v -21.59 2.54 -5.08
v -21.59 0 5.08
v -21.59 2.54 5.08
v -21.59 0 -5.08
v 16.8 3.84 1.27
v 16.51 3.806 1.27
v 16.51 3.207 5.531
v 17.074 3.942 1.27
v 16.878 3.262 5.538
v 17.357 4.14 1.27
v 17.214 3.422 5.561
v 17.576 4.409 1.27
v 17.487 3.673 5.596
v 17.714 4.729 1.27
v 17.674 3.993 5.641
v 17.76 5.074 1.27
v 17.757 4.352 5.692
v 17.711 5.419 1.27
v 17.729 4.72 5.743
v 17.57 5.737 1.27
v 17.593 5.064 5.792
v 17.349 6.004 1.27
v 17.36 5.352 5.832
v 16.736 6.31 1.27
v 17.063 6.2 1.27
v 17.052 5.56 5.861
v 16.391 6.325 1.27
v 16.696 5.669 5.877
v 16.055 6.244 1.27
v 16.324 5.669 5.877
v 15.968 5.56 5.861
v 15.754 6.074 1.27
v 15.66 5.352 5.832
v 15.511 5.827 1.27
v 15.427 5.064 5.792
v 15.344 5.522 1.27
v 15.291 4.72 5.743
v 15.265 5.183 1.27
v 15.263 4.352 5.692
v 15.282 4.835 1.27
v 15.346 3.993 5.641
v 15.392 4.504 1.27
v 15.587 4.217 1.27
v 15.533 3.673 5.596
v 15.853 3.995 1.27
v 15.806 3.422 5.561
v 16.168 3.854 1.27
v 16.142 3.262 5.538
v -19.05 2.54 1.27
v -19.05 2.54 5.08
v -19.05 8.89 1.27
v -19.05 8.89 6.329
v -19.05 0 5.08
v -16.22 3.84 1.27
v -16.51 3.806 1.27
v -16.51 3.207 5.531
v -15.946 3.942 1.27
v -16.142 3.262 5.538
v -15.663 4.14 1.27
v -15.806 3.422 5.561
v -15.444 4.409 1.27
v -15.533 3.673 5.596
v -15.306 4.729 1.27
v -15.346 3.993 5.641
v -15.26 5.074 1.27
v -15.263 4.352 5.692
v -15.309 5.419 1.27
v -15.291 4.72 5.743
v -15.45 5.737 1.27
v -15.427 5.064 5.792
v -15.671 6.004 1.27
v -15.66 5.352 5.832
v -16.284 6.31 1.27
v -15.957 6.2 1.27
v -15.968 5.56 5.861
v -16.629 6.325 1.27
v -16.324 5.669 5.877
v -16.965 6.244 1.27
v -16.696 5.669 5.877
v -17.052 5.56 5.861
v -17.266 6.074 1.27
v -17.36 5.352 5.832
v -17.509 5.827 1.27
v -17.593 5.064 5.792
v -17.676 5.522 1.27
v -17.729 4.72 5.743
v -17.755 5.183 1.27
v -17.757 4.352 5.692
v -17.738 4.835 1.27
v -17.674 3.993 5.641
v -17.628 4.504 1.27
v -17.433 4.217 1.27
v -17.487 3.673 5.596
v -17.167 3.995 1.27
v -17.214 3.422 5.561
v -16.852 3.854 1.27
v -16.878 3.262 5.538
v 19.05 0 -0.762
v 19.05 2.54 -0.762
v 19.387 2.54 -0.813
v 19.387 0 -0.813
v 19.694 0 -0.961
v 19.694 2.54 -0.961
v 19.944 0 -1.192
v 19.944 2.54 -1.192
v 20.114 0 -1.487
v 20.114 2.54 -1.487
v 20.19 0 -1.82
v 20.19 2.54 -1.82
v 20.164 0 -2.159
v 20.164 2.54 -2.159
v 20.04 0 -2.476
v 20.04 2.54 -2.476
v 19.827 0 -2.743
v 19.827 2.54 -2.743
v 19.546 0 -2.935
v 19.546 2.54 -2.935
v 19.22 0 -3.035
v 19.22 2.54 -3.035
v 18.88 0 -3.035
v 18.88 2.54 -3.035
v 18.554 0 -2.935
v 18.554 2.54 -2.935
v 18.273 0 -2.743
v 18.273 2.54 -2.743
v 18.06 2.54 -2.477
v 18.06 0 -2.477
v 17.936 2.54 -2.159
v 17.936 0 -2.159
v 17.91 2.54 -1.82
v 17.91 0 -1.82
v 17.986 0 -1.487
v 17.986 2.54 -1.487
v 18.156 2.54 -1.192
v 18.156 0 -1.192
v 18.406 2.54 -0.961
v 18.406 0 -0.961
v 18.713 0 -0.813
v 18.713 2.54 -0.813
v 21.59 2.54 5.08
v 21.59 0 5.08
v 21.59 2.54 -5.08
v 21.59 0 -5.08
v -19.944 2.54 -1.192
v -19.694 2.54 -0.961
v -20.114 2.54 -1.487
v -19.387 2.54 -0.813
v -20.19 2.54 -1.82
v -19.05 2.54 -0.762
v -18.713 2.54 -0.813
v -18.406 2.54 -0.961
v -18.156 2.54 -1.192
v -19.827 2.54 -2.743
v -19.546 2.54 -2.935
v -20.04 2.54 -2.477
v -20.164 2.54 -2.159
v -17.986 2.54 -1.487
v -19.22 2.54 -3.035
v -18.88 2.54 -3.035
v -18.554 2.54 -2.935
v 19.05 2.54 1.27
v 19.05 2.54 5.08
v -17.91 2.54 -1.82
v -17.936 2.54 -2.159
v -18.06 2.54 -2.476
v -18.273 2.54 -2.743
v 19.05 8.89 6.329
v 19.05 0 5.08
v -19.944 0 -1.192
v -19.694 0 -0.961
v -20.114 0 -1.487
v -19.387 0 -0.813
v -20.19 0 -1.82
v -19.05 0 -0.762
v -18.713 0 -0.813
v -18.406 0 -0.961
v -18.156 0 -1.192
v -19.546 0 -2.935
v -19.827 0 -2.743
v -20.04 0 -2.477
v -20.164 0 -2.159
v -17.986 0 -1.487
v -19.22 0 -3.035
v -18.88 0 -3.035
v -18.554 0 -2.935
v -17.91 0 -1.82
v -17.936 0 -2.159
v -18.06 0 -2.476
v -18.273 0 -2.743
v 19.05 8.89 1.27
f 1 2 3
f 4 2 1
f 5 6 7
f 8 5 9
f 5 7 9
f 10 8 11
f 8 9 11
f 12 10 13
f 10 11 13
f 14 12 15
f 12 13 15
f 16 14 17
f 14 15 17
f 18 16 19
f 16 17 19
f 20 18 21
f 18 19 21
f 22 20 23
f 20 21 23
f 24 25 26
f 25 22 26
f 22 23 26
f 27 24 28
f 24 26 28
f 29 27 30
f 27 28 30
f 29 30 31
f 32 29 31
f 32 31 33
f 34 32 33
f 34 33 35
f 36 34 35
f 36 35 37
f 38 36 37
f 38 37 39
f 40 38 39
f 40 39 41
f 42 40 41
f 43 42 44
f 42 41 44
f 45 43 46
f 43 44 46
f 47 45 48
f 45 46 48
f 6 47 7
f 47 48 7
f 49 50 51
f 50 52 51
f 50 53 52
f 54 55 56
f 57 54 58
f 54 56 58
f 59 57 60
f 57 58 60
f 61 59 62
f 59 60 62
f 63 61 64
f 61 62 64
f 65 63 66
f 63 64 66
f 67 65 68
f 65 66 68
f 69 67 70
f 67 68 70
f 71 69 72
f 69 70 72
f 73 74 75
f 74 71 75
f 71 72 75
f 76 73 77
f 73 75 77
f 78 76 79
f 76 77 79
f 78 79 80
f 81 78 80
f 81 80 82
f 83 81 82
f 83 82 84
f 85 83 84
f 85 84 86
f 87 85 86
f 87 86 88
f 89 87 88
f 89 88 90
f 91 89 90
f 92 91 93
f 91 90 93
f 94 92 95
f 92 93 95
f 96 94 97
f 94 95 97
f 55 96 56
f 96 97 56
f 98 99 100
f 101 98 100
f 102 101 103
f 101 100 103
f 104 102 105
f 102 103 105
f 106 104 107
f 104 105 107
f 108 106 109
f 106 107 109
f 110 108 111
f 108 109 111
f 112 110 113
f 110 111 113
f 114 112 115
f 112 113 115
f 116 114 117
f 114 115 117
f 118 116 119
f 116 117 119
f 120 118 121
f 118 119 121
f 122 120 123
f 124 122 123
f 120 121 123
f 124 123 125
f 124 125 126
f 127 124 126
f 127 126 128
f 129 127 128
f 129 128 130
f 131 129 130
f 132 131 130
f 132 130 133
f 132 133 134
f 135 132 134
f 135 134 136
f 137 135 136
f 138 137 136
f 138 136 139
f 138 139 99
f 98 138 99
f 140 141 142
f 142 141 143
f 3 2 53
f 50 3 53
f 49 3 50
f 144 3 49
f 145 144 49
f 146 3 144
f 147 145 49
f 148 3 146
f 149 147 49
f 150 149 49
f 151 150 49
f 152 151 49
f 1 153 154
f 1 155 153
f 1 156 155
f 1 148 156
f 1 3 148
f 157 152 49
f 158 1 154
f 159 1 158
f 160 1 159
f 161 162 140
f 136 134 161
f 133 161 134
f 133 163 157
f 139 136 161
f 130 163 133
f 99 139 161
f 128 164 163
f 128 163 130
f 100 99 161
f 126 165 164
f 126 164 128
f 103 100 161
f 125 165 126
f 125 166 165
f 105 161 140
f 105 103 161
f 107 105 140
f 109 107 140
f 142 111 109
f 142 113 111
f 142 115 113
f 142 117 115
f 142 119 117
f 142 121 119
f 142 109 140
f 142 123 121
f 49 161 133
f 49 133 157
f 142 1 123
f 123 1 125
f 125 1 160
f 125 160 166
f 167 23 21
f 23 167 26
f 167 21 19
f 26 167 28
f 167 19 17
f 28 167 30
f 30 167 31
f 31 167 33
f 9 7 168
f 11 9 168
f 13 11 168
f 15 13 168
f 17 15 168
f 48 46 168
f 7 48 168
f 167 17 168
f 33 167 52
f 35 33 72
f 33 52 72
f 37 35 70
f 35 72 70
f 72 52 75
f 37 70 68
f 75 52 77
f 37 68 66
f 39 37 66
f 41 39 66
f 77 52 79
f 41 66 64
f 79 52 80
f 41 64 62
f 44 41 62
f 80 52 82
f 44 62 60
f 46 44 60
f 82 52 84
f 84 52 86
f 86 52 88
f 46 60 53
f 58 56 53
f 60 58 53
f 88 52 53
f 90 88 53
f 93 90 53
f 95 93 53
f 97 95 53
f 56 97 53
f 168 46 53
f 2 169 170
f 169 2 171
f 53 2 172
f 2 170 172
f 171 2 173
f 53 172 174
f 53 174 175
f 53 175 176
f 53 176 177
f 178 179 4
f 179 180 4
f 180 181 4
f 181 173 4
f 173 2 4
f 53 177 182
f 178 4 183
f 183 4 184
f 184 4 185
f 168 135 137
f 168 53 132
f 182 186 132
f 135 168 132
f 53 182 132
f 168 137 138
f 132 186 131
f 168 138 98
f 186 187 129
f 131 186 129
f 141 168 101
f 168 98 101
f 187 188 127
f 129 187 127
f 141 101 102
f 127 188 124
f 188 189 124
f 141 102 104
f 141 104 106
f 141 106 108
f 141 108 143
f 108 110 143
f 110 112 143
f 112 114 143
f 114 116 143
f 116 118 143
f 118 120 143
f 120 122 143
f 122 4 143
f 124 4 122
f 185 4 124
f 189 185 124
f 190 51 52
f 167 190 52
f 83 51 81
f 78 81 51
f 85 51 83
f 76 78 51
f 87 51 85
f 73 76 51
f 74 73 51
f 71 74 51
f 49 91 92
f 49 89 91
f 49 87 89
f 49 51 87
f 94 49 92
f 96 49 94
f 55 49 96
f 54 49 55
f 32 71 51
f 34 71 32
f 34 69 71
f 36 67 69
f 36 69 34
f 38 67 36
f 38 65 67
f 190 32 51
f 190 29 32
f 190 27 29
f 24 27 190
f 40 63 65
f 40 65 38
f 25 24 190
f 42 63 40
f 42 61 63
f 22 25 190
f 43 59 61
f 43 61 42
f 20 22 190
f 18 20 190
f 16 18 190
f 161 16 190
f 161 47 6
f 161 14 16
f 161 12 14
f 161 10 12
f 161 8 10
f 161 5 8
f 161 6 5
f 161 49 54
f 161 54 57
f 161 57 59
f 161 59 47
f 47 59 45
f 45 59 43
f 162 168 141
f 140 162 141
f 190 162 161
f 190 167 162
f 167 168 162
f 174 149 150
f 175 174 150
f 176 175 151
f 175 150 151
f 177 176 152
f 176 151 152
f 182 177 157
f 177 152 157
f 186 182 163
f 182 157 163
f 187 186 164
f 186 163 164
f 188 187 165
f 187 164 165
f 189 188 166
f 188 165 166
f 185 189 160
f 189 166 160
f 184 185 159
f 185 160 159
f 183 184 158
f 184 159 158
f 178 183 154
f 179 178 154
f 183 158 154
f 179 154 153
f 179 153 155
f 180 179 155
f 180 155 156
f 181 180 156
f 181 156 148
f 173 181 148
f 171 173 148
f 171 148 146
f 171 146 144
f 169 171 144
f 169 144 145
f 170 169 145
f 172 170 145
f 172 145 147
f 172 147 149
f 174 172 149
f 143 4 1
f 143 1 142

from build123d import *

# Parameters (mm, degrees)
SKETCH2_W           = 43.18
SKETCH2_H           = 10.16
BOSS_EXTRUDE1_DEPTH = 2.54
SKETCH3_W           = 38.1
SKETCH3_H           = 3.81
BOSS_EXTRUDE2_DEPTH = 6.35
SKETCH4_R           = 1.143
CUT_EXTRUDE1_DEPTH  = 24.070695698
BOSS_EXTRUDE3_DEPTH = 38.1
SKETCH6_R           = 1.25
CUT_EXTRUDE2_DEPTH  = 26.677507073


with BuildPart() as part:
    # Sketch2 → Boss-Extrude1 (new body)
    with BuildSketch(Plane(origin=(0, 0, 0), x_dir=(1, 0, 0), z_dir=(0, 1, 0))):
        Rectangle(SKETCH2_W, SKETCH2_H)
    extrude(amount=BOSS_EXTRUDE1_DEPTH)

    # Sketch3 → Boss-Extrude2 (add)
    with BuildSketch(Plane(origin=(0, 2.54, 0), x_dir=(1, 0, 0), z_dir=(0, 1, 0))):
        with Locations((0, -3.175)):
            Rectangle(SKETCH3_W, SKETCH3_H)
    extrude(amount=BOSS_EXTRUDE2_DEPTH)

    # Sketch4 → Cut-Extrude1 (cut, through all)
    with BuildSketch(Plane(origin=(0, 2.54, 0), x_dir=(1, 0, 0), z_dir=(0, 1, 0))):
        with Locations(Location((19.05, 1.905, 0), (0, 0, 270))):
            Circle(SKETCH4_R)
        with Locations(Location((-19.05, 1.905, 0), (0, 0, 270))):
            Circle(SKETCH4_R)
    extrude(amount=-CUT_EXTRUDE1_DEPTH, mode=Mode.SUBTRACT)

    # Sketch5 → Boss-Extrude3 (add)
    with BuildSketch(Plane.ZY.offset(19.05)):
        Polygon((5.08, 8.89), (6.329408021, 8.89), (5.08, 0), align=None)
    extrude(amount=-BOSS_EXTRUDE3_DEPTH)

    # Sketch6 → Cut-Extrude2 (cut, through all)
    with BuildSketch(Plane(origin=(0, -0.700118884, 4.981604708), x_dir=(1, 0, 0), z_dir=(0, -0.1391731009600584, 0.9902680687415715))):
        with Locations(Location((-16.51, 5.195682913, 0), (0, 0, 270))):
            Circle(SKETCH6_R)
        with Locations(Location((16.51, 5.195682913, 0), (0, 0, 270))):
            Circle(SKETCH6_R)
    extrude(amount=-CUT_EXTRUDE2_DEPTH, mode=Mode.SUBTRACT)


solid = part.part
